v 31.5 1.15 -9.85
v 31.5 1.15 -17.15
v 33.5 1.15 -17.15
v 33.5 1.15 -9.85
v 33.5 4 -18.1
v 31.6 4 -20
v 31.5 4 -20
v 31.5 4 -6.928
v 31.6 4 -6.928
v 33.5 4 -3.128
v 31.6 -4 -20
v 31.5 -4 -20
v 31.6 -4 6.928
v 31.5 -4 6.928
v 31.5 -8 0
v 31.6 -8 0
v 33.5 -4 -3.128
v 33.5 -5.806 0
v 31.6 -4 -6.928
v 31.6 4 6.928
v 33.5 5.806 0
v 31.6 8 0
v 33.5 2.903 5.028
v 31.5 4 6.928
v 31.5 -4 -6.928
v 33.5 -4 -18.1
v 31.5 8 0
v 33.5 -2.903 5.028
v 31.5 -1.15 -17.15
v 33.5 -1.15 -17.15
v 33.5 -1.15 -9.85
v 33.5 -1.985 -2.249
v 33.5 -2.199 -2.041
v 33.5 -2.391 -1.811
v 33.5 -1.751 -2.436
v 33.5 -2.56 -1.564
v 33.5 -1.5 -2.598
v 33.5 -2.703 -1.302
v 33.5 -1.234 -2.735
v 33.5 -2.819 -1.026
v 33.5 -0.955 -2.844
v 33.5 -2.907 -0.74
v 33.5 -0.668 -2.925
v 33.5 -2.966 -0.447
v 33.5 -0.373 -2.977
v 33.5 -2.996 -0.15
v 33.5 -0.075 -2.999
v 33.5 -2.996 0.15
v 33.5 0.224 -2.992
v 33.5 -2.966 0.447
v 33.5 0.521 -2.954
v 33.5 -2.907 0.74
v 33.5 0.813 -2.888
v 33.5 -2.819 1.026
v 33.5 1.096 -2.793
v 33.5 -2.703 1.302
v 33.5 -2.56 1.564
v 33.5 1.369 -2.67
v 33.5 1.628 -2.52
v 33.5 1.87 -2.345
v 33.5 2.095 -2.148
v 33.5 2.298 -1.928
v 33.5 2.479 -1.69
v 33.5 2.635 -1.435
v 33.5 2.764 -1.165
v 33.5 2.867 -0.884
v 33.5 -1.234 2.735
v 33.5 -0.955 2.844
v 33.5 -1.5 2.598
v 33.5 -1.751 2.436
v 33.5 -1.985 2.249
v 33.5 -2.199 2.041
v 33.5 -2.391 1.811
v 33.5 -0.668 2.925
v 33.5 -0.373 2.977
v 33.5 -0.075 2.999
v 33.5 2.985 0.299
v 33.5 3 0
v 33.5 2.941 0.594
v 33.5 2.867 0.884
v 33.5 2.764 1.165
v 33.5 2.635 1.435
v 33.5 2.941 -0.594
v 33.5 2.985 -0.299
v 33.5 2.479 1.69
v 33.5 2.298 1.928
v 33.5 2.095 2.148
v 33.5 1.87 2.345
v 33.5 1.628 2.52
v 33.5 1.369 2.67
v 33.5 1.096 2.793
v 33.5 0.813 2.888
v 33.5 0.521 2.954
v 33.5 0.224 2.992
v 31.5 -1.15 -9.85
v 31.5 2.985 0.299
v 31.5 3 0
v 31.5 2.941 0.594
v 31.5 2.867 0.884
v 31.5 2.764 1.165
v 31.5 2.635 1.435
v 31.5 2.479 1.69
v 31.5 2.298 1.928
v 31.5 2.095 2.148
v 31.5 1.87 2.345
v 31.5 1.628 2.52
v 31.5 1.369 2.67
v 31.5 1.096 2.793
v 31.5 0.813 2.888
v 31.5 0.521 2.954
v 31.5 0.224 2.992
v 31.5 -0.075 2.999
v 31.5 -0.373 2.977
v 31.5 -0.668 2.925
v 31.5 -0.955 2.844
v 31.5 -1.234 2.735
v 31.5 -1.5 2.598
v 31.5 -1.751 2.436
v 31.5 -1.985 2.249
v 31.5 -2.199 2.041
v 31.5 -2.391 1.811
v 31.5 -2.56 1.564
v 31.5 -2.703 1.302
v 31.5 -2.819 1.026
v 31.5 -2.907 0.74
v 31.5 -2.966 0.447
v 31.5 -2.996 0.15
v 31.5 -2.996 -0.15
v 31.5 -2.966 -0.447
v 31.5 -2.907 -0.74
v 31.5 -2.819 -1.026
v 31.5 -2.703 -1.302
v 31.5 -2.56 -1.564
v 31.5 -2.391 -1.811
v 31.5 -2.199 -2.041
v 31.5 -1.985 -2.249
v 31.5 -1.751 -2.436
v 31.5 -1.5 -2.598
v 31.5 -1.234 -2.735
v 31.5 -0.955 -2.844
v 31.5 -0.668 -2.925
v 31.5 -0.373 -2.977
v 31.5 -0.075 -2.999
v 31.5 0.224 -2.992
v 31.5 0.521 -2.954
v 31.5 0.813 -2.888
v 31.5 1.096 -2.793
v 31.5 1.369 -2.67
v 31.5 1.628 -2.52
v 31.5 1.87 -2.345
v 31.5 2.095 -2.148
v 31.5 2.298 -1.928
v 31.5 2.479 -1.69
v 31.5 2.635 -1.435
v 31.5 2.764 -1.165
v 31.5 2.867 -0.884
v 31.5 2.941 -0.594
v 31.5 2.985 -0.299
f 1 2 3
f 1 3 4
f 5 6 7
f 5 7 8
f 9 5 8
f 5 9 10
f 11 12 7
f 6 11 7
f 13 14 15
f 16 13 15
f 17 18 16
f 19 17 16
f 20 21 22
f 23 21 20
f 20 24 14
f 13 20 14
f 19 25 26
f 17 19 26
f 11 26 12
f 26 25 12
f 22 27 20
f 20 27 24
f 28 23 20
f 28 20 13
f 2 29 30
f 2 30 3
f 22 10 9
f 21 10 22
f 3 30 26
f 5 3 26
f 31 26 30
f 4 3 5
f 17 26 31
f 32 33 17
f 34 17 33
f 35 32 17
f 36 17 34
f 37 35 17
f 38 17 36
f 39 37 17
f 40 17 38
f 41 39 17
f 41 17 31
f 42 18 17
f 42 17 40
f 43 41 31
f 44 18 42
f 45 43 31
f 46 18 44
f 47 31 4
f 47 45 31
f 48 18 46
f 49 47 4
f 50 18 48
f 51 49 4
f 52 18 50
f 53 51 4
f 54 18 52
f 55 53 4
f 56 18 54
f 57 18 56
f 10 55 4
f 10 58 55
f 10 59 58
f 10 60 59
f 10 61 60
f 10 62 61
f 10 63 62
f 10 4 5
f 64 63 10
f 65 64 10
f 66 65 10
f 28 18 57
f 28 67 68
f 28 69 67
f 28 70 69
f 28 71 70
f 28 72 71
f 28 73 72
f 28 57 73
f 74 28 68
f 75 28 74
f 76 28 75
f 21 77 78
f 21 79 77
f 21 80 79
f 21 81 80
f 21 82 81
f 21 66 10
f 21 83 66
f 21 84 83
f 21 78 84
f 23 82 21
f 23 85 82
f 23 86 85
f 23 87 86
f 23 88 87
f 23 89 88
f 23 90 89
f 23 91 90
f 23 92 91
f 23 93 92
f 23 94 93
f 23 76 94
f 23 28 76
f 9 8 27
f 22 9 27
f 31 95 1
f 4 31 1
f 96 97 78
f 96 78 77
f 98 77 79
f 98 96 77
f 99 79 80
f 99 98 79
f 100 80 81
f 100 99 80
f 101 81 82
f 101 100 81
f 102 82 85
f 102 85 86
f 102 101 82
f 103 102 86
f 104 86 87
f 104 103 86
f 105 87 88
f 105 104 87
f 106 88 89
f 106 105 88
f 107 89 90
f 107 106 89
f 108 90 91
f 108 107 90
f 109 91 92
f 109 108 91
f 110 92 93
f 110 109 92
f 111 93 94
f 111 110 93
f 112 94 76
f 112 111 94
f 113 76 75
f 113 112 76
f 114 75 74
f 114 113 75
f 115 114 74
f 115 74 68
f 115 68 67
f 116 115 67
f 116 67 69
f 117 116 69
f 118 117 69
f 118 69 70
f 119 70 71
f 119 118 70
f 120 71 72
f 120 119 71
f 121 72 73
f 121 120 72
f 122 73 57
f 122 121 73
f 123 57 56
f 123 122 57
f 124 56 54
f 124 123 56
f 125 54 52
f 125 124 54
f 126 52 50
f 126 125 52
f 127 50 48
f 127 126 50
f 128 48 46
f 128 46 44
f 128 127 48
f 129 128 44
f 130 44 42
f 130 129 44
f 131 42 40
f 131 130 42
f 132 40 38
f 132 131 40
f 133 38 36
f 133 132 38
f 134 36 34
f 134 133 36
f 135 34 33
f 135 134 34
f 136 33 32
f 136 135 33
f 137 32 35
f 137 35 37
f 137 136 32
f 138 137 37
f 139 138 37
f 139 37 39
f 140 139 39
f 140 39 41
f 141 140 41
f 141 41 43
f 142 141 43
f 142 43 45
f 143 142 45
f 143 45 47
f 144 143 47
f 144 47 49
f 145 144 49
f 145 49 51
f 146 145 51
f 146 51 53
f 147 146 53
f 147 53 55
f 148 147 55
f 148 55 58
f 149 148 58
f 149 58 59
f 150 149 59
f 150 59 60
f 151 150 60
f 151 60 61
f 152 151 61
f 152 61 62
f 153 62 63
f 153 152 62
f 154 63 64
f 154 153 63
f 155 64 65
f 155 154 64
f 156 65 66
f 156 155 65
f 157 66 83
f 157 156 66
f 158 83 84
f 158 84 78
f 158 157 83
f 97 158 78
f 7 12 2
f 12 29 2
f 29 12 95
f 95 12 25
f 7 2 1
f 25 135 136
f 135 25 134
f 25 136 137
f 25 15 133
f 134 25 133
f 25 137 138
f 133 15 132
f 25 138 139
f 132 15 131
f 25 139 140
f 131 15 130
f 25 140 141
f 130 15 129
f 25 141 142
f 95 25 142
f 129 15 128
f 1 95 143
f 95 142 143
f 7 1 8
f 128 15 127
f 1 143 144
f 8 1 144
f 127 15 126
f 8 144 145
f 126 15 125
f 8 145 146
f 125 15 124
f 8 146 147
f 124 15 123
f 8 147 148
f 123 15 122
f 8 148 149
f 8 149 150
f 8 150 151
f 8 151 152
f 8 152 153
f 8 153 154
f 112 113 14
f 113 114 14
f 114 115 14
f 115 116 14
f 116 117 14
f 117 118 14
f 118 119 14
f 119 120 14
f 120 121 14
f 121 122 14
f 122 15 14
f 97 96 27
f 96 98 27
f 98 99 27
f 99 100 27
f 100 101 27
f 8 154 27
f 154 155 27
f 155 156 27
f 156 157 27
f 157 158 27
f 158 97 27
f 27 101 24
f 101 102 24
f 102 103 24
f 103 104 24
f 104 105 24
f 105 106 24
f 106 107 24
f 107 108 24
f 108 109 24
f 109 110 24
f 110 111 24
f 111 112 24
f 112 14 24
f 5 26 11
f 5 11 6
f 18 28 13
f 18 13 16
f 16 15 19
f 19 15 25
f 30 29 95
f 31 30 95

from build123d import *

# Parameters (mm, degrees)
SKETCH073_R     = 3
SKETCH073_W     = 2.3
SKETCH073_H     = 7.3
PAD053_DEPTH    = 2
CHAMFER_SIZE    = 1.9
CHAMFER006_SIZE = 1.9


with BuildPart() as part:
    # Sketch073 → Pad053 (new body)
    with BuildSketch(Plane.YZ.offset(31.5)):
        Polygon((8, 0), (4, 6.928203), (-4, 6.928203), (-8, 0), (-4, -6.928203), (-4, -20), (4, -20), (4, -6.928203), align=None)
        Circle(SKETCH073_R, mode=Mode.SUBTRACT)
        with Locations((0, -13.5)):
            Rectangle(SKETCH073_W, SKETCH073_H, mode=Mode.SUBTRACT)
    extrude(amount=PAD053_DEPTH)

    # Chamfer
    chamfer_edges = [part.edges().sort_by_distance(p)[0] for p in [
        (33.5, -6, 3.464102),
        (33.5, -6, -3.464102),
        (33.5, 0, 6.928203),
        (33.5, 6, 3.464102),
        (33.5, 6, -3.464102),
    ]]
    chamfer(chamfer_edges, length=CHAMFER_SIZE)

    # Chamfer006
    chamfer006_edges = [part.edges().sort_by_distance(p)[0] for p in [
        (33.5, 0, -20),
    ]]
    chamfer(chamfer006_edges, length=CHAMFER006_SIZE)


solid = part.part
